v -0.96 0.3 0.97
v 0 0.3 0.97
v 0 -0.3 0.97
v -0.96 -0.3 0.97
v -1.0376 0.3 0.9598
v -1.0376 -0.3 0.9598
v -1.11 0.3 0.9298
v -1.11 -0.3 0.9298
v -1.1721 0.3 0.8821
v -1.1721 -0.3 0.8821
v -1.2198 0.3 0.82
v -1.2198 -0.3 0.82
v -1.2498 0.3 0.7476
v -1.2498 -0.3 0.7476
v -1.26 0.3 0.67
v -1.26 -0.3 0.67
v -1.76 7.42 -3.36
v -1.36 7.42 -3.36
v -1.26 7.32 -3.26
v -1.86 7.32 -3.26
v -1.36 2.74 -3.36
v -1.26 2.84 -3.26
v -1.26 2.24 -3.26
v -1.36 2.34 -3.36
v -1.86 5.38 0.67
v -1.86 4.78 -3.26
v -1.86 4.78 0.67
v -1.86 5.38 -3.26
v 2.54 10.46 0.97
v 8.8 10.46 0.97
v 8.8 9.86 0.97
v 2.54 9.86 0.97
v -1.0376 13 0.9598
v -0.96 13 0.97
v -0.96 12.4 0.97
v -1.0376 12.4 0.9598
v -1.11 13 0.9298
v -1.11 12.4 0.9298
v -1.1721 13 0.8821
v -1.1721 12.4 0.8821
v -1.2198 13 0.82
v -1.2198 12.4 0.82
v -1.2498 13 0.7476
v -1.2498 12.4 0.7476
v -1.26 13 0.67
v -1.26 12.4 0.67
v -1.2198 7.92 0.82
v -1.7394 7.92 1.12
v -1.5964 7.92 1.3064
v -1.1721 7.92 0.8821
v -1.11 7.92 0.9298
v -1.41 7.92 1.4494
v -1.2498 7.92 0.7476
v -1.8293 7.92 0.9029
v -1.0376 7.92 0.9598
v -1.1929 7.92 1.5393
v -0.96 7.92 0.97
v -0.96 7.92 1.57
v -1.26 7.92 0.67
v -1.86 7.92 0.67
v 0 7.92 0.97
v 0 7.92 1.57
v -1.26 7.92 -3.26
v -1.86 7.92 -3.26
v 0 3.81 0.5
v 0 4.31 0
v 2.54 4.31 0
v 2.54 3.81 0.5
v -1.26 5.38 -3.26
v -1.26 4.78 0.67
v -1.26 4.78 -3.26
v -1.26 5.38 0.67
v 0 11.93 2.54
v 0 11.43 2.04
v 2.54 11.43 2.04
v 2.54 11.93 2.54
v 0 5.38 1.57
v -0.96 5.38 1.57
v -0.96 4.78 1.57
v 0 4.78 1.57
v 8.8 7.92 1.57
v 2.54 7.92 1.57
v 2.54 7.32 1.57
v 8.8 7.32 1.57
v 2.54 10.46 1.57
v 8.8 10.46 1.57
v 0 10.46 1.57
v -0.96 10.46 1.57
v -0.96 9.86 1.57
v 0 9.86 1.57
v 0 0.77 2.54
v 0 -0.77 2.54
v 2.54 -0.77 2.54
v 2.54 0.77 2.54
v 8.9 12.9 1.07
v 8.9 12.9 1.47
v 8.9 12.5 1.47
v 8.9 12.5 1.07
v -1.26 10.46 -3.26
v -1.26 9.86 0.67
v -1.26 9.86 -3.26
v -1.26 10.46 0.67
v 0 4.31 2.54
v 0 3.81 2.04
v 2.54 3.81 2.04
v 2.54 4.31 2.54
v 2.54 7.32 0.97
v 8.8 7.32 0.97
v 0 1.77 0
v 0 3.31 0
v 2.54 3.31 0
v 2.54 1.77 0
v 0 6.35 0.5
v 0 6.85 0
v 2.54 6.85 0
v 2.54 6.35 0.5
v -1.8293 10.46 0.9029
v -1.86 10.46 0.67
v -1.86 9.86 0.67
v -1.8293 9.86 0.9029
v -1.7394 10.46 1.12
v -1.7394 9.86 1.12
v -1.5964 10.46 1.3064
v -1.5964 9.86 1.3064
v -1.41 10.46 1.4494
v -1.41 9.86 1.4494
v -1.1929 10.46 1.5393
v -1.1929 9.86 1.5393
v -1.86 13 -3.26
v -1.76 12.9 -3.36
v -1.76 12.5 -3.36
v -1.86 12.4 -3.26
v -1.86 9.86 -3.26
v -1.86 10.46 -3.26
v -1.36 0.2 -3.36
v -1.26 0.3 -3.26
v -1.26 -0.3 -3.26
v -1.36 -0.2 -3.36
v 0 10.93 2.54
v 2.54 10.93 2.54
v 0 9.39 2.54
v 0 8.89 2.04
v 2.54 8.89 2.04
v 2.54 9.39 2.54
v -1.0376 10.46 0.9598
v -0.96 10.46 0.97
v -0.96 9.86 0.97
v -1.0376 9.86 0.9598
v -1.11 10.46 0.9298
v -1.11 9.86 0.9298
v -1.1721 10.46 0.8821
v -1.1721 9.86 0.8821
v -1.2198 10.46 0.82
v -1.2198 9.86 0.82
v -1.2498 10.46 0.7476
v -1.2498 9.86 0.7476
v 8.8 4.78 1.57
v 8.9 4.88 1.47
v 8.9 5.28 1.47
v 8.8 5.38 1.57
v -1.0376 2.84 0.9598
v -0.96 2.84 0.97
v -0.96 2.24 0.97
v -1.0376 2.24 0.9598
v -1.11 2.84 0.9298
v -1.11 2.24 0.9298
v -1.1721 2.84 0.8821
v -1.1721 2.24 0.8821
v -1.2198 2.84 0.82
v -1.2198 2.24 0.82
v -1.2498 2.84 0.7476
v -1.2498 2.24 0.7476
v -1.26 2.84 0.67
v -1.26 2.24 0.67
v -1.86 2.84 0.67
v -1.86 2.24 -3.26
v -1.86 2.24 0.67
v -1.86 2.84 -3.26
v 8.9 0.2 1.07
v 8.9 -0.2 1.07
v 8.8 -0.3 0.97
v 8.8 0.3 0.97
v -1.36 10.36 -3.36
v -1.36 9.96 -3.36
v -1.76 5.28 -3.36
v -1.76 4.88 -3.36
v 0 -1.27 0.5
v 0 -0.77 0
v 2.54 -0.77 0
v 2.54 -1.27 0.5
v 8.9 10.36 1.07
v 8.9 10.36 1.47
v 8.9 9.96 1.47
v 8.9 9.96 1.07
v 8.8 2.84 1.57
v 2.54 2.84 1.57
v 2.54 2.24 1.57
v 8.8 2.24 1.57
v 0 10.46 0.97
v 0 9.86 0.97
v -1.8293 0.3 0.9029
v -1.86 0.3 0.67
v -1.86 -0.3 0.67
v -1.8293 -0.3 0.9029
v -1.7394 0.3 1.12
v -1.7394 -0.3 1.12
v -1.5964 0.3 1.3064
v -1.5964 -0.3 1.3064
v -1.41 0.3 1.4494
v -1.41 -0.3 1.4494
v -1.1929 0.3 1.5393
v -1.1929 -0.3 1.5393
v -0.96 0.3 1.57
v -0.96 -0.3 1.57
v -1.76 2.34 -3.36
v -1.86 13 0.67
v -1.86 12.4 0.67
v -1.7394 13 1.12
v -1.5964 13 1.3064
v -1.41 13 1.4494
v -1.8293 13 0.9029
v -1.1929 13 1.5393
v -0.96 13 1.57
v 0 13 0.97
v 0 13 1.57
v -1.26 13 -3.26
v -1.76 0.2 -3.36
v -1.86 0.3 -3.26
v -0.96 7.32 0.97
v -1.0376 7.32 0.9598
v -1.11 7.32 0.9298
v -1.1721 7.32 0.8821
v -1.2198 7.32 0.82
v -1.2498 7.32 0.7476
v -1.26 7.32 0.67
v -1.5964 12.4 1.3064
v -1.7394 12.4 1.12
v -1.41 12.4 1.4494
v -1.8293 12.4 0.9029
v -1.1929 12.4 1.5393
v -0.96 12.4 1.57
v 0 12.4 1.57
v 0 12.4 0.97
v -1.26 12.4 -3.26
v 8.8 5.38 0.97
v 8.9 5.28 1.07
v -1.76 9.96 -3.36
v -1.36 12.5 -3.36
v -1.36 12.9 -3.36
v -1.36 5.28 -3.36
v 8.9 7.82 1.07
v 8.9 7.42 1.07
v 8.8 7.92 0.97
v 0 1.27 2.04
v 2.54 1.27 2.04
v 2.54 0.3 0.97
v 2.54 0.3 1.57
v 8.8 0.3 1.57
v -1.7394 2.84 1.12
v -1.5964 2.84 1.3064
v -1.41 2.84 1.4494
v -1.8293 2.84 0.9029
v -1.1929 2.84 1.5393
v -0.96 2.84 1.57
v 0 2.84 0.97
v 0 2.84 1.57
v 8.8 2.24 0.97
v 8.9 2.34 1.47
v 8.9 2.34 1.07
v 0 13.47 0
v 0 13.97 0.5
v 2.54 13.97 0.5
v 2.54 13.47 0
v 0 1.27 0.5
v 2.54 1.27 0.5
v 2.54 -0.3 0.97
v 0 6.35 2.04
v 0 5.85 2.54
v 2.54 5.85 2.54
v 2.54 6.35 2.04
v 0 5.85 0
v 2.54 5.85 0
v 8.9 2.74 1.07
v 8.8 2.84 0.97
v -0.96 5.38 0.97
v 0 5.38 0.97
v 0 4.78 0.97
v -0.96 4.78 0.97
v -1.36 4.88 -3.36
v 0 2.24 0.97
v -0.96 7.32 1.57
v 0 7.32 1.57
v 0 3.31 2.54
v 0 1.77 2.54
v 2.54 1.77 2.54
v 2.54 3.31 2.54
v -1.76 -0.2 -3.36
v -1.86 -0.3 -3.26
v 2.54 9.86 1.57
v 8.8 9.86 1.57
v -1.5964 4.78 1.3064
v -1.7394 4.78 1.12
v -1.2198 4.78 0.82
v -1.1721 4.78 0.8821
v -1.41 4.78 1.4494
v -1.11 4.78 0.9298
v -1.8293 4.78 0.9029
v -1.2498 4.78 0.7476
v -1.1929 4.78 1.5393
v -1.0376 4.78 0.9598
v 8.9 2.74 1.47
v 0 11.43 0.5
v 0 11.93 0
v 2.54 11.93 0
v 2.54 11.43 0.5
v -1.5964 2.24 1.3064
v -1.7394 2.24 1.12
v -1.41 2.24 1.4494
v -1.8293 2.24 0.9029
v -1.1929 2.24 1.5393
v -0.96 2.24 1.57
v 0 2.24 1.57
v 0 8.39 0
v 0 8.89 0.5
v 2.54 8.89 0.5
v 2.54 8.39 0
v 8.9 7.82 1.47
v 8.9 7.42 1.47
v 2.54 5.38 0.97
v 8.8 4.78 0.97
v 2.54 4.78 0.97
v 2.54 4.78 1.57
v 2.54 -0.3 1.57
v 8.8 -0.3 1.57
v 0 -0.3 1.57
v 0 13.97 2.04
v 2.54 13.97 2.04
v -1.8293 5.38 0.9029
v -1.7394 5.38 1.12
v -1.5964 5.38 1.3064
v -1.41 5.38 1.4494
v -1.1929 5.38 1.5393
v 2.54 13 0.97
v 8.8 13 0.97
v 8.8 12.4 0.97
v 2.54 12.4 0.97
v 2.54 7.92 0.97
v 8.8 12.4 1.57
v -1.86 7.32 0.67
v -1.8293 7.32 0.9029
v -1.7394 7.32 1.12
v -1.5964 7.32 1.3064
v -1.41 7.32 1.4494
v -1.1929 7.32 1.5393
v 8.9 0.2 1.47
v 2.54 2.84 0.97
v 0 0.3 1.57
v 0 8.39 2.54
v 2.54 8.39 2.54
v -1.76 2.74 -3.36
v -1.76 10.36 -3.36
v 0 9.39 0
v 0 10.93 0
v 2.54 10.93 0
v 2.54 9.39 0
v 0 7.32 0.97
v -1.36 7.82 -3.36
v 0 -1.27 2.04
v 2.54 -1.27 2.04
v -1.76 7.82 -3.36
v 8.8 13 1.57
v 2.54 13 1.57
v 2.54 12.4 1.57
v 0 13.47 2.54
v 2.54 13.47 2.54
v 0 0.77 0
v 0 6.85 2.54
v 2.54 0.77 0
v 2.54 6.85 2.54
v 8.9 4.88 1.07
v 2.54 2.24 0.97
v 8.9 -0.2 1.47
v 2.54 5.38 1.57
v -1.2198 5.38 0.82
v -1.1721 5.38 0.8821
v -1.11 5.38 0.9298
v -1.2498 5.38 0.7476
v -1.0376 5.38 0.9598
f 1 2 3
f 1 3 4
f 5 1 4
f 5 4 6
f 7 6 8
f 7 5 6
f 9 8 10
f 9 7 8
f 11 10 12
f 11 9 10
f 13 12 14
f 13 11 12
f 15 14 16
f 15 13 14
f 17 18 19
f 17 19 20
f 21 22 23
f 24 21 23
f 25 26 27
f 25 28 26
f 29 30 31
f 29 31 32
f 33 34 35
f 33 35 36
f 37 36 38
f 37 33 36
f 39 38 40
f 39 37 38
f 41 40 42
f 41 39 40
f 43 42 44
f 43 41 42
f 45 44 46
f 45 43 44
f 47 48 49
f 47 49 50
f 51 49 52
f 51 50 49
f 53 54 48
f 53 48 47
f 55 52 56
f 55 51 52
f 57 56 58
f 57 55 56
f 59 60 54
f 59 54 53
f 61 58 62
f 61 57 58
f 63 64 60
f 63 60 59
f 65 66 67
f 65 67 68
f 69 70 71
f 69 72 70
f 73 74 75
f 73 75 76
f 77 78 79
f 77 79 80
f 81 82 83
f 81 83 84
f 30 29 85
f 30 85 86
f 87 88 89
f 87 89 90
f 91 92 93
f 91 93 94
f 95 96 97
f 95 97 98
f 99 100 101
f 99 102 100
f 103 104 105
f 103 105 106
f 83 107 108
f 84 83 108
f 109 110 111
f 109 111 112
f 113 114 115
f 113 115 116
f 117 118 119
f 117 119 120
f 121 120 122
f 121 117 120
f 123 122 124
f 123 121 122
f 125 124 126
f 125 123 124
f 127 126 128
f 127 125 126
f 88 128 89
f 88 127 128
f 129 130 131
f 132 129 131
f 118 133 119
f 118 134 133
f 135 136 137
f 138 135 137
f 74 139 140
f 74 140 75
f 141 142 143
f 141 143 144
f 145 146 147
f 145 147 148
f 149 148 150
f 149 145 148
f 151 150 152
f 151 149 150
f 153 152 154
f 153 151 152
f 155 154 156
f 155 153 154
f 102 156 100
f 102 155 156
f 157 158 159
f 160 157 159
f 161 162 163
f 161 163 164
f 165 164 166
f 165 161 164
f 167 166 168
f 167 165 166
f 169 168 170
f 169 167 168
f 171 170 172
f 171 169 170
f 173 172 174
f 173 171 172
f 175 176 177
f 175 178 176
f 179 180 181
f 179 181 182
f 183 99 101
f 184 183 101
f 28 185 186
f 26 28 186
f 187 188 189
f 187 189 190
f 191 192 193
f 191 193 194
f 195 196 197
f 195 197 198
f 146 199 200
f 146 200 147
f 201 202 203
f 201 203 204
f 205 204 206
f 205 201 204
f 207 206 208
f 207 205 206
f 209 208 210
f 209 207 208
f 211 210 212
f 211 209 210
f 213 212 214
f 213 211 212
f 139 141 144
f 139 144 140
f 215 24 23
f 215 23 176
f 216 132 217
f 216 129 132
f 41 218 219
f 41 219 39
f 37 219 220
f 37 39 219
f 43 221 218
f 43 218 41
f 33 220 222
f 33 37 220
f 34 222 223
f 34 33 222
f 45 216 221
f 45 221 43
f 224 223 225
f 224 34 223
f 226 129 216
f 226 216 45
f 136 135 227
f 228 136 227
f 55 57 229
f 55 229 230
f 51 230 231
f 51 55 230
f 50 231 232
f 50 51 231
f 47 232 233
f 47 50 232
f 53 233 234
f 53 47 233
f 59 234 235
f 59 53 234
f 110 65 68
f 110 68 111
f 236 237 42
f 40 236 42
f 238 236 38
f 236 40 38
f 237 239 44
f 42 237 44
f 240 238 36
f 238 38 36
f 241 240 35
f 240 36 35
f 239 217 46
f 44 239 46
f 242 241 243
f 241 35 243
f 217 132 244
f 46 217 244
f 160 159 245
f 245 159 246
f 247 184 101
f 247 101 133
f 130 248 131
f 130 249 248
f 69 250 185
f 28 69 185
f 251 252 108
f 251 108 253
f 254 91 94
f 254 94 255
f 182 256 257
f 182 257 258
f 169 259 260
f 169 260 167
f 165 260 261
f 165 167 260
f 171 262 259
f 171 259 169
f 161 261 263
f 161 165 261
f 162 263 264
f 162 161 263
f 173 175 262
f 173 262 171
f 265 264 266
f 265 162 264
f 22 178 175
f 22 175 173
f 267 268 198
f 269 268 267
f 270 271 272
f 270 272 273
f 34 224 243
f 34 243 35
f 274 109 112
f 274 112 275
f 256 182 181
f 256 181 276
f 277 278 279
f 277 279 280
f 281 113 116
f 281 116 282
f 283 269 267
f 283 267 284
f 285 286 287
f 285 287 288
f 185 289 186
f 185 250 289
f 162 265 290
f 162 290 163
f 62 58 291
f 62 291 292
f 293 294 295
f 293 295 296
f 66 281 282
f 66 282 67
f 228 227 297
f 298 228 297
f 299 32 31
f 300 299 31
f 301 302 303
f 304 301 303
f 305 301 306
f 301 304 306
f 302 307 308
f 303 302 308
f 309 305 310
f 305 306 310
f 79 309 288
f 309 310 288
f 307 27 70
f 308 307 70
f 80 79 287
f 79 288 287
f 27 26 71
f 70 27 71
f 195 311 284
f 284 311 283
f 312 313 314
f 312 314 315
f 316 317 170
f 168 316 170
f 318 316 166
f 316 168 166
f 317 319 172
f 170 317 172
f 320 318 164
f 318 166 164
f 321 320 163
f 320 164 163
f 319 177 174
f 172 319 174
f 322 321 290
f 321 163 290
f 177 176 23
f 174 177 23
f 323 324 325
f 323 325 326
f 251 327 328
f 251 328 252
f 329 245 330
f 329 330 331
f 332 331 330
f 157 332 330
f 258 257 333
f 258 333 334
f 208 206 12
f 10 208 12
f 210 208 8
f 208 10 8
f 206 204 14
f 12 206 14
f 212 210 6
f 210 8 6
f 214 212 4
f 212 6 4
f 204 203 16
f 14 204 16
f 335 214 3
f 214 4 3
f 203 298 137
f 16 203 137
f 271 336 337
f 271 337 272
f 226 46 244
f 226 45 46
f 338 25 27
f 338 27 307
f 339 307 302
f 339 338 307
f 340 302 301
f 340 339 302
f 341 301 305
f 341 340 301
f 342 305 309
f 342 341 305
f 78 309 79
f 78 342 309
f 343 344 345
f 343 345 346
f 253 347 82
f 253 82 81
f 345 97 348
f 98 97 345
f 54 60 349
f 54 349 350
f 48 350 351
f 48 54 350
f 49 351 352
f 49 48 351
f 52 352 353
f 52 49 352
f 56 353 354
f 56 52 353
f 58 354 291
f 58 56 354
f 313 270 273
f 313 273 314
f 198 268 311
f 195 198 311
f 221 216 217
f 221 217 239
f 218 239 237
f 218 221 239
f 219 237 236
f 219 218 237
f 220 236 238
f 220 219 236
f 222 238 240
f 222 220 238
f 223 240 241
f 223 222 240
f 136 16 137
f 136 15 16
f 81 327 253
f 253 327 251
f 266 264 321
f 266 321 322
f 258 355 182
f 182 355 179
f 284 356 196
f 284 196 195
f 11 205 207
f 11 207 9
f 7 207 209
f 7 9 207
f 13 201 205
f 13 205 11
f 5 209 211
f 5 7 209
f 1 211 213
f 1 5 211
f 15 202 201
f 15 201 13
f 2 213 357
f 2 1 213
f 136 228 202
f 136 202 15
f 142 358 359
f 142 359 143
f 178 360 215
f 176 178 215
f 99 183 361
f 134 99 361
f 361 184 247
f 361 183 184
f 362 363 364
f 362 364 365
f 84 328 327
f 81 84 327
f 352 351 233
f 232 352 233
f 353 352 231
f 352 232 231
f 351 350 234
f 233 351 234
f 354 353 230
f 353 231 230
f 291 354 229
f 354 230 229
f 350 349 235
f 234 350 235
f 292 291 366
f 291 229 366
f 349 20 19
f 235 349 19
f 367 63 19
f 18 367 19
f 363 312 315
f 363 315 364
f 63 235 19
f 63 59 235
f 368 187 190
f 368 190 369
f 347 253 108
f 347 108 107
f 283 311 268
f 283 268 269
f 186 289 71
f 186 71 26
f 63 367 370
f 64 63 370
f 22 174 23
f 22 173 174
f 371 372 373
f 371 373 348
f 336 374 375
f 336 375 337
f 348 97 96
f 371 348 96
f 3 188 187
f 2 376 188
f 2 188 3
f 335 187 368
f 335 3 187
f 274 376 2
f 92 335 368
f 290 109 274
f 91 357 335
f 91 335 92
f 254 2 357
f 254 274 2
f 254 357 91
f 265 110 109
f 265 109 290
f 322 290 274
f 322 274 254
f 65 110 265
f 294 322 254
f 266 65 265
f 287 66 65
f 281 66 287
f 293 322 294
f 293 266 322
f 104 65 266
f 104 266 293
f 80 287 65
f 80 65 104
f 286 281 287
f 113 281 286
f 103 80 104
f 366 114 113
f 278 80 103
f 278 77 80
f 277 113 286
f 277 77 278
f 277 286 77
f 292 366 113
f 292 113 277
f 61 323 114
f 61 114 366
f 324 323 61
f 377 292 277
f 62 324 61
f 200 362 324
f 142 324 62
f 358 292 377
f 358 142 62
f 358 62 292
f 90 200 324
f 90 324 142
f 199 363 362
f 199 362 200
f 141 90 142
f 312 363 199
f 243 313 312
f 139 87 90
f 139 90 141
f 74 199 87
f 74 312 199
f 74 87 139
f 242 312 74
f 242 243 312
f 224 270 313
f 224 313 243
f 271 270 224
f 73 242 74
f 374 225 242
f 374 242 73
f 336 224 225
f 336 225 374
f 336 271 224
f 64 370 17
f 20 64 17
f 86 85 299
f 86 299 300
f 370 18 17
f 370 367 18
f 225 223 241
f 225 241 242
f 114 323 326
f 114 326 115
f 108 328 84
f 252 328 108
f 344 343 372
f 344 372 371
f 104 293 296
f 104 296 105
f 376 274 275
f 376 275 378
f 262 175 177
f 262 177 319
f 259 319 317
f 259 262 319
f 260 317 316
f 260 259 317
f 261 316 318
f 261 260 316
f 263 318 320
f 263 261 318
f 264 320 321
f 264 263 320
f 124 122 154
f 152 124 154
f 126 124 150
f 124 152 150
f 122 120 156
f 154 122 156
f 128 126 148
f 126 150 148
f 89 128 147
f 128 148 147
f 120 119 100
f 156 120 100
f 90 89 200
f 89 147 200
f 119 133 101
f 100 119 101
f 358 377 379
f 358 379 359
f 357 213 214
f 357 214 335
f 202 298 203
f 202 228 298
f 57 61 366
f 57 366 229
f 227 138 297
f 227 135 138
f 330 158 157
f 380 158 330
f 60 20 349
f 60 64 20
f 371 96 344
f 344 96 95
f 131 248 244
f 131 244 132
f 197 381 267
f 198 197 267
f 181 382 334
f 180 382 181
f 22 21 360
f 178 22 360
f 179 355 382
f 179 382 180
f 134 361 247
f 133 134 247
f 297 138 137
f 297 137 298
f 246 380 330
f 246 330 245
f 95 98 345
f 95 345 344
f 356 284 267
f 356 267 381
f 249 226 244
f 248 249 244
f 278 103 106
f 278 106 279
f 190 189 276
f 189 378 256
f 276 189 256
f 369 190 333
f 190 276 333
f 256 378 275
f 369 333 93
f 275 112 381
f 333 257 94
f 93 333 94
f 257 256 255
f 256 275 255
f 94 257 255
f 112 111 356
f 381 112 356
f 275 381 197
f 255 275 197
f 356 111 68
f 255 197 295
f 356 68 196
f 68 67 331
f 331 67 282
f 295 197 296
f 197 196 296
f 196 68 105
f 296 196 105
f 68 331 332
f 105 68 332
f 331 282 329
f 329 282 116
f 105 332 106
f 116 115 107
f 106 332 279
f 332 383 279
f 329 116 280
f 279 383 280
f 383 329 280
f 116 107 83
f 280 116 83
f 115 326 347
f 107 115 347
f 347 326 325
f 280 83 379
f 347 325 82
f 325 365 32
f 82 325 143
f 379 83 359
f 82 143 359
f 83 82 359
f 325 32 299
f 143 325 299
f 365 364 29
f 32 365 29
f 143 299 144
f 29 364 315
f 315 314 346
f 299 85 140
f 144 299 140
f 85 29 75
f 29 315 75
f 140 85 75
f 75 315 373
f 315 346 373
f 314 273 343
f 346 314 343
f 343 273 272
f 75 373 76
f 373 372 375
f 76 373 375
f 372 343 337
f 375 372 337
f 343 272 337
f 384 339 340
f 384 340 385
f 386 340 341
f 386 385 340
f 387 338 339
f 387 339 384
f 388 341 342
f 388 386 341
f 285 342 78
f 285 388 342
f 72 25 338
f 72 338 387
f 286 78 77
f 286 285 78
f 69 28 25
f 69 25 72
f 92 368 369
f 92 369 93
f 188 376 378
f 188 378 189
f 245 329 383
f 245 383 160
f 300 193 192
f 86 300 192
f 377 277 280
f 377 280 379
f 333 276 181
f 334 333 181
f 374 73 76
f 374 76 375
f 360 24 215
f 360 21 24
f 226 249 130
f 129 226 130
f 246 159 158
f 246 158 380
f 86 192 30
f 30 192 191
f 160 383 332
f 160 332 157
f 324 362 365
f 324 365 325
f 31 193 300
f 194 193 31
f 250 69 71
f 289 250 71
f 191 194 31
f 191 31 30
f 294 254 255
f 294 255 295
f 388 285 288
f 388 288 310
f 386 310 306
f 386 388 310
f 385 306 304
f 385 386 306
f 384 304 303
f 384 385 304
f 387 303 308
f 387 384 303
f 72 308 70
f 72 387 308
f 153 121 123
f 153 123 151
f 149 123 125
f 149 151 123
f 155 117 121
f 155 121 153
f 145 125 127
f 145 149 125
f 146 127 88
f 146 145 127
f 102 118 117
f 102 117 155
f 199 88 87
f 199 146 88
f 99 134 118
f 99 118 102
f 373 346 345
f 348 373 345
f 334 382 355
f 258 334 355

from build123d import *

# Parameters (mm, degrees)
PLASTIC_DEPTH   = 2.54
CONTACT_DEPTH   = 0.3
CHAMFER1_SIZE   = 0.1
LPATTERN1_COUNT = 6
LPATTERN1_PITCH = 2.54


with BuildPart() as part:
    # Sketch1 → Plastic (new body)
    with BuildSketch(Plane(origin=(0, 0, 0), x_dir=(0, 0, -1), z_dir=(1, 0, 0))):
        Polygon((-2.04, 1.27), (-0.5, 1.27), (0, 0.77), (0, -0.77), (-0.5, -1.27), (-2.04, -1.27), (-2.54, -0.77), (-2.54, 0.77), align=None)
    extrude(amount=PLASTIC_DEPTH)

    # Sketch2 → Contact (add, symmetric)
    with BuildSketch(Plane(origin=(0, 0, 0), x_dir=(1, 0, 0), z_dir=(0, 1, 0))):
        with BuildLine():
            Line((-1.86, 3.36), (-1.86, -0.67))
            ThreePointArc((-1.86, -0.67), (-1.596396103, -1.306396103), (-0.96, -1.57))
            Line((-0.96, -1.57), (8.9, -1.57))
            Line((8.9, -1.57), (8.9, -0.97))
            Line((8.9, -0.97), (-0.96, -0.97))
            ThreePointArc((-0.96, -0.97), (-1.172132034, -0.882132034), (-1.26, -0.67))
            Line((-1.26, -0.67), (-1.26, 3.36))
            Line((-1.26, 3.36), (-1.86, 3.36))
        make_face()
    extrude(amount=CONTACT_DEPTH, both=True)

    # Chamfer1
    chamfer1_edges = [part.edges().sort_by_distance(p)[0] for p in [
        (8.9, 0, 0.97),
        (8.9, 0.3, 1.27),
        (-1.56, -0.3, -3.36),
        (-1.26, 0, -3.36),
        (-1.86, 0, -3.36),
        (8.9, -0.3, 1.27),
        (8.9, 0, 1.57),
        (-1.56, 0.3, -3.36),
    ]]
    chamfer(chamfer1_edges, length=CHAMFER1_SIZE)

    # LPattern1: part ×6


with BuildPart() as part_1:
    add(part.part)
    with Locations(*[(0, i * LPATTERN1_PITCH, 0) for i in range(1, LPATTERN1_COUNT)]):
        add(part.part)


solid = part_1.part
